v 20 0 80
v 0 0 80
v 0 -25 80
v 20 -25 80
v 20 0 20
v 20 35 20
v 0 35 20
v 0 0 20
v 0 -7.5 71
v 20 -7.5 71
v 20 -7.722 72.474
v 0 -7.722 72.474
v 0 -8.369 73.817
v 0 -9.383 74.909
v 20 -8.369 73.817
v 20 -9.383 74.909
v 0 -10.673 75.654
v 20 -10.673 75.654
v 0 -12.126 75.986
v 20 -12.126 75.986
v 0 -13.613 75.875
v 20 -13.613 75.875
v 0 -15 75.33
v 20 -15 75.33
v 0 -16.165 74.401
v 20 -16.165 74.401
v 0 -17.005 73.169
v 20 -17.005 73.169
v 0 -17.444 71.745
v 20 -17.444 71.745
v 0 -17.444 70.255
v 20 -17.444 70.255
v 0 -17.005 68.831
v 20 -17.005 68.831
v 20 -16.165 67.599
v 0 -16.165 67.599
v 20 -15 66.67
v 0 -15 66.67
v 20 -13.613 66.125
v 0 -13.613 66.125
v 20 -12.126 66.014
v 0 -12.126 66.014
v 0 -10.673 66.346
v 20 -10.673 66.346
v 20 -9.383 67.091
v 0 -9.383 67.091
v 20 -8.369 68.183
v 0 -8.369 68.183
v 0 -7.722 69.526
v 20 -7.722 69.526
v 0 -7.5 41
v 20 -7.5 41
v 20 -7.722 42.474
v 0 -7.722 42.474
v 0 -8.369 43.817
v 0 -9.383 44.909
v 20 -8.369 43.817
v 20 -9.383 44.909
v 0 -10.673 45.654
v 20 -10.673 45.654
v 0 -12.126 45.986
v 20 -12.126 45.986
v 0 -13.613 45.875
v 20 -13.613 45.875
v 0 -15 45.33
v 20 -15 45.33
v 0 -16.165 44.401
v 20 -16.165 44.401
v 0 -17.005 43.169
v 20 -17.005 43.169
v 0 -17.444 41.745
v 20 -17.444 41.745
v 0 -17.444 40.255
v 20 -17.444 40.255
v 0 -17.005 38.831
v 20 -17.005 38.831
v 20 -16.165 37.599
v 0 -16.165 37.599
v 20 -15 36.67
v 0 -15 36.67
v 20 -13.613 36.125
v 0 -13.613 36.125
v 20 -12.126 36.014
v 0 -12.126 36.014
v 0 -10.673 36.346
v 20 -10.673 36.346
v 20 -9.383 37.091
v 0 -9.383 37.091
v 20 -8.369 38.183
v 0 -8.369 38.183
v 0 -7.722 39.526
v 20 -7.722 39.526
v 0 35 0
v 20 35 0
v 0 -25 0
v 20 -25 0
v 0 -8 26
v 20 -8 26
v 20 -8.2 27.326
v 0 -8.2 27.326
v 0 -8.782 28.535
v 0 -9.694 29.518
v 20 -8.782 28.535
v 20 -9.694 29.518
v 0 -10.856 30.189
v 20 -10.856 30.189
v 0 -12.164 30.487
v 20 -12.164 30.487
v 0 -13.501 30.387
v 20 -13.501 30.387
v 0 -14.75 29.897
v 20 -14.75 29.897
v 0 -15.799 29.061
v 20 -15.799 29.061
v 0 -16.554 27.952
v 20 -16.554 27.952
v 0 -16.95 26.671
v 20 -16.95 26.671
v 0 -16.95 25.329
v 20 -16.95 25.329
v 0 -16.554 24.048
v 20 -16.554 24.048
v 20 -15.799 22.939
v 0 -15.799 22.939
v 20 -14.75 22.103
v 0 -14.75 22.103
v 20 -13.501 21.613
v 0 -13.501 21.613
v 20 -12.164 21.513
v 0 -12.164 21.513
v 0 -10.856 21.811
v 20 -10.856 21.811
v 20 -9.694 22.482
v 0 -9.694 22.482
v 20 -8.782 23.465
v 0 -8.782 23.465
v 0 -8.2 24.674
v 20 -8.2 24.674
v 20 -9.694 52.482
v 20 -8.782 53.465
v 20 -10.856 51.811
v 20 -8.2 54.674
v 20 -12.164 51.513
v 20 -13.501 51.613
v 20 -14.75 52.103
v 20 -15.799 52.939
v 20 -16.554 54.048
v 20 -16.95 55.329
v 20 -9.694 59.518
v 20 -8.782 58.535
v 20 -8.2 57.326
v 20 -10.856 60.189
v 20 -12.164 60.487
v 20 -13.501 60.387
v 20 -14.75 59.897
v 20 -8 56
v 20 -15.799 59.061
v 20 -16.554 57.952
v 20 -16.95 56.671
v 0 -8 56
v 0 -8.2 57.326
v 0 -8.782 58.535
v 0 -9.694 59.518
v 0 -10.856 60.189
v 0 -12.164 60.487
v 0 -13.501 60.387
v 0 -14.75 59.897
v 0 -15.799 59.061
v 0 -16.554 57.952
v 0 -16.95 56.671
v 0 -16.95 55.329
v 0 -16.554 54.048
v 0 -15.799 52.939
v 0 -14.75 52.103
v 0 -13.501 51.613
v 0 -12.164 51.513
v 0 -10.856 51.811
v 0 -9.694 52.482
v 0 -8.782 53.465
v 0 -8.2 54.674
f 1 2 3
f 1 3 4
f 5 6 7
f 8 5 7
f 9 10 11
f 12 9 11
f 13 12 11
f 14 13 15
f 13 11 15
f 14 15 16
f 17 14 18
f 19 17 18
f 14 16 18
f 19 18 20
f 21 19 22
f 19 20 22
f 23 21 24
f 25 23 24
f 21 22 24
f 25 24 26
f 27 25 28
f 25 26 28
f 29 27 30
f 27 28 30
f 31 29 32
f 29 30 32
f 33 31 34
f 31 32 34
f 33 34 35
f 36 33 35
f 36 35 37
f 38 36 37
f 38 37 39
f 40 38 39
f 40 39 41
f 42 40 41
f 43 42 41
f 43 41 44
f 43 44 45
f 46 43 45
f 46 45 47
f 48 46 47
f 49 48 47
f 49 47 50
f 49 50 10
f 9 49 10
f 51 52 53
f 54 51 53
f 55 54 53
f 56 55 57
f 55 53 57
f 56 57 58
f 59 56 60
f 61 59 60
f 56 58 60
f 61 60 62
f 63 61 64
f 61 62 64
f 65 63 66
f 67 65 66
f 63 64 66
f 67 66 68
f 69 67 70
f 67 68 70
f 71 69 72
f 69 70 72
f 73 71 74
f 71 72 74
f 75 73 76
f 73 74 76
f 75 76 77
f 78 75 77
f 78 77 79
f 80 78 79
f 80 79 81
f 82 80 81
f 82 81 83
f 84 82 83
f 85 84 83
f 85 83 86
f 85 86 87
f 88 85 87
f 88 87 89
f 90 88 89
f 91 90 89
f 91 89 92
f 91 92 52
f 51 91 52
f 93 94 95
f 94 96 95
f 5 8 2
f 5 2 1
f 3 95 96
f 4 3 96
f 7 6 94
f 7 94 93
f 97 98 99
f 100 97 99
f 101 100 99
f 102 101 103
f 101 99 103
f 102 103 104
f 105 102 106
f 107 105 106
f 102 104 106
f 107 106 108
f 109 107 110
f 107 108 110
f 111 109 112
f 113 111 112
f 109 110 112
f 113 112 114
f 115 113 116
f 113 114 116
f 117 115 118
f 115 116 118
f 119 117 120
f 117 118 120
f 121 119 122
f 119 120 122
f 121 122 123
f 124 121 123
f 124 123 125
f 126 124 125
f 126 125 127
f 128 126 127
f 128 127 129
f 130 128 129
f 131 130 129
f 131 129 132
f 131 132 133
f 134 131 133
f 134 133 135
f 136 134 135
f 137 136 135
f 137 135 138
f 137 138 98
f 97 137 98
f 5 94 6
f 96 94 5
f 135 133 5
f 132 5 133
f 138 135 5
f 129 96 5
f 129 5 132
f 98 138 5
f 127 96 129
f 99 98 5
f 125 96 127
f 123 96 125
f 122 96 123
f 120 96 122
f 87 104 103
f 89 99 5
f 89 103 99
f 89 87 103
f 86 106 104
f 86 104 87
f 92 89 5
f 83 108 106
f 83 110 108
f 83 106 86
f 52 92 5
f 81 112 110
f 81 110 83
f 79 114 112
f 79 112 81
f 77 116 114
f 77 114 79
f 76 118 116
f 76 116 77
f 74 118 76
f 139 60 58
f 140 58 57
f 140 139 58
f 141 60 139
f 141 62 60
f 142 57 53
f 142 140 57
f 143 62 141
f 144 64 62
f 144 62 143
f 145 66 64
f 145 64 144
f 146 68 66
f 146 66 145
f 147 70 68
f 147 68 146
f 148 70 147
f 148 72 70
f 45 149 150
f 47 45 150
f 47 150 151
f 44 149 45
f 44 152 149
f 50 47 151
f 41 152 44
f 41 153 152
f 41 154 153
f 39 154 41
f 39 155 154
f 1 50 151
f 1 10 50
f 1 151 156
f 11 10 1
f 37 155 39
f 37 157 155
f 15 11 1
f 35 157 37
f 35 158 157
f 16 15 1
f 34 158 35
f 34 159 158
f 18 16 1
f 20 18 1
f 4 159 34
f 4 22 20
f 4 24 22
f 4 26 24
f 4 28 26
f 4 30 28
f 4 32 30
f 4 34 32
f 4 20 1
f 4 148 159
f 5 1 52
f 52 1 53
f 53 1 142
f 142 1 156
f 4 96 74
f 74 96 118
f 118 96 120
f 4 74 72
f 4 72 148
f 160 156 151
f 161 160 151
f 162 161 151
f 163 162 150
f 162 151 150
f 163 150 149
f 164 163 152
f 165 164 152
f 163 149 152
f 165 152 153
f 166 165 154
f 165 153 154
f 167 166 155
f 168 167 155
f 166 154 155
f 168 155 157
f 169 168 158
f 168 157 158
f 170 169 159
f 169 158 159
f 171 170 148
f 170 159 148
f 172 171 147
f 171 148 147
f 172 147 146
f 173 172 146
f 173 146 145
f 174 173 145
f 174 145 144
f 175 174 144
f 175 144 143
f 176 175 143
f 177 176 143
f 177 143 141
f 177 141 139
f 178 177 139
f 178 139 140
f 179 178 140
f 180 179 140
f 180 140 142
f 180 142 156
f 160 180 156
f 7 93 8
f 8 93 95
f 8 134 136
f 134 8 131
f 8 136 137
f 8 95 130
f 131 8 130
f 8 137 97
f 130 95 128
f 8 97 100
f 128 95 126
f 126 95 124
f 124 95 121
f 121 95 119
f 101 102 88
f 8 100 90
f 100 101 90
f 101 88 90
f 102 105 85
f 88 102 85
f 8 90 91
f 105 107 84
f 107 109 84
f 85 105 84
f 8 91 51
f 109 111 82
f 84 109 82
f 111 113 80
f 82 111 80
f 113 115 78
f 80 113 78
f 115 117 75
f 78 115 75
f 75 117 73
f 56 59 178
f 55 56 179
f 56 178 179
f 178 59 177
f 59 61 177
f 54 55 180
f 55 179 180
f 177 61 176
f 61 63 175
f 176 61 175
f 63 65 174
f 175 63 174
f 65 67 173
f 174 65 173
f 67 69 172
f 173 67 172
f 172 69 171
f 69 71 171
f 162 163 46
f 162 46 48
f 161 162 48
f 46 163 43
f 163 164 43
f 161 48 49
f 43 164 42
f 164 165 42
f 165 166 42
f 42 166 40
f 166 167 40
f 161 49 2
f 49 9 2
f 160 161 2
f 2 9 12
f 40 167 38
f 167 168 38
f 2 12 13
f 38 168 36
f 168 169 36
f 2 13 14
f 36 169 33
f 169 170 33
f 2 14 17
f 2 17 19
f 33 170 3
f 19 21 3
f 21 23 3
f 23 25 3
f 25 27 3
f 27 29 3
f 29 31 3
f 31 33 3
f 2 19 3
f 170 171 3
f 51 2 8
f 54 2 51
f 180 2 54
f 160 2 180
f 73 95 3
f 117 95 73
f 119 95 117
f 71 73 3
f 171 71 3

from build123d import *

# Parameters (mm, degrees)
F0_W     = 20
F0_H     = 25
F1_DEPTH = 80
F2_R     = 5
F2_R_2   = 4.5
F3_DEPTH = 25
F4_W     = 20
F4_H     = 20
F5_DEPTH = 35


with BuildPart() as f1:
    # F0 (on Top) → F1 (new body)
    with BuildSketch(Plane.XY):
        with Locations((10, -12.5)):
            Rectangle(F0_W, F0_H)
    extrude(amount=F1_DEPTH)

    # F2 (on face) → F3 (cut)
    with BuildSketch(Plane.YZ.offset(20)):
        with Locations((-12.5, 71)):
            Circle(F2_R)
        with Locations((-12.5, 56)):
            Circle(F2_R_2)
        with Locations((-12.5, 41)):
            Circle(F2_R)
        with Locations((-12.5, 26)):
            Circle(F2_R_2)
    extrude(amount=-F3_DEPTH, mode=Mode.SUBTRACT)

    # F4 (on face) → F5 (join)
    with BuildSketch(Plane(origin=(0, 0, 0), x_dir=(-1, 0, 0), z_dir=(0, 1, 0))):
        with Locations((-10, 10)):
            Rectangle(F4_W, F4_H)
    extrude(amount=F5_DEPTH)


solid = f1.part
